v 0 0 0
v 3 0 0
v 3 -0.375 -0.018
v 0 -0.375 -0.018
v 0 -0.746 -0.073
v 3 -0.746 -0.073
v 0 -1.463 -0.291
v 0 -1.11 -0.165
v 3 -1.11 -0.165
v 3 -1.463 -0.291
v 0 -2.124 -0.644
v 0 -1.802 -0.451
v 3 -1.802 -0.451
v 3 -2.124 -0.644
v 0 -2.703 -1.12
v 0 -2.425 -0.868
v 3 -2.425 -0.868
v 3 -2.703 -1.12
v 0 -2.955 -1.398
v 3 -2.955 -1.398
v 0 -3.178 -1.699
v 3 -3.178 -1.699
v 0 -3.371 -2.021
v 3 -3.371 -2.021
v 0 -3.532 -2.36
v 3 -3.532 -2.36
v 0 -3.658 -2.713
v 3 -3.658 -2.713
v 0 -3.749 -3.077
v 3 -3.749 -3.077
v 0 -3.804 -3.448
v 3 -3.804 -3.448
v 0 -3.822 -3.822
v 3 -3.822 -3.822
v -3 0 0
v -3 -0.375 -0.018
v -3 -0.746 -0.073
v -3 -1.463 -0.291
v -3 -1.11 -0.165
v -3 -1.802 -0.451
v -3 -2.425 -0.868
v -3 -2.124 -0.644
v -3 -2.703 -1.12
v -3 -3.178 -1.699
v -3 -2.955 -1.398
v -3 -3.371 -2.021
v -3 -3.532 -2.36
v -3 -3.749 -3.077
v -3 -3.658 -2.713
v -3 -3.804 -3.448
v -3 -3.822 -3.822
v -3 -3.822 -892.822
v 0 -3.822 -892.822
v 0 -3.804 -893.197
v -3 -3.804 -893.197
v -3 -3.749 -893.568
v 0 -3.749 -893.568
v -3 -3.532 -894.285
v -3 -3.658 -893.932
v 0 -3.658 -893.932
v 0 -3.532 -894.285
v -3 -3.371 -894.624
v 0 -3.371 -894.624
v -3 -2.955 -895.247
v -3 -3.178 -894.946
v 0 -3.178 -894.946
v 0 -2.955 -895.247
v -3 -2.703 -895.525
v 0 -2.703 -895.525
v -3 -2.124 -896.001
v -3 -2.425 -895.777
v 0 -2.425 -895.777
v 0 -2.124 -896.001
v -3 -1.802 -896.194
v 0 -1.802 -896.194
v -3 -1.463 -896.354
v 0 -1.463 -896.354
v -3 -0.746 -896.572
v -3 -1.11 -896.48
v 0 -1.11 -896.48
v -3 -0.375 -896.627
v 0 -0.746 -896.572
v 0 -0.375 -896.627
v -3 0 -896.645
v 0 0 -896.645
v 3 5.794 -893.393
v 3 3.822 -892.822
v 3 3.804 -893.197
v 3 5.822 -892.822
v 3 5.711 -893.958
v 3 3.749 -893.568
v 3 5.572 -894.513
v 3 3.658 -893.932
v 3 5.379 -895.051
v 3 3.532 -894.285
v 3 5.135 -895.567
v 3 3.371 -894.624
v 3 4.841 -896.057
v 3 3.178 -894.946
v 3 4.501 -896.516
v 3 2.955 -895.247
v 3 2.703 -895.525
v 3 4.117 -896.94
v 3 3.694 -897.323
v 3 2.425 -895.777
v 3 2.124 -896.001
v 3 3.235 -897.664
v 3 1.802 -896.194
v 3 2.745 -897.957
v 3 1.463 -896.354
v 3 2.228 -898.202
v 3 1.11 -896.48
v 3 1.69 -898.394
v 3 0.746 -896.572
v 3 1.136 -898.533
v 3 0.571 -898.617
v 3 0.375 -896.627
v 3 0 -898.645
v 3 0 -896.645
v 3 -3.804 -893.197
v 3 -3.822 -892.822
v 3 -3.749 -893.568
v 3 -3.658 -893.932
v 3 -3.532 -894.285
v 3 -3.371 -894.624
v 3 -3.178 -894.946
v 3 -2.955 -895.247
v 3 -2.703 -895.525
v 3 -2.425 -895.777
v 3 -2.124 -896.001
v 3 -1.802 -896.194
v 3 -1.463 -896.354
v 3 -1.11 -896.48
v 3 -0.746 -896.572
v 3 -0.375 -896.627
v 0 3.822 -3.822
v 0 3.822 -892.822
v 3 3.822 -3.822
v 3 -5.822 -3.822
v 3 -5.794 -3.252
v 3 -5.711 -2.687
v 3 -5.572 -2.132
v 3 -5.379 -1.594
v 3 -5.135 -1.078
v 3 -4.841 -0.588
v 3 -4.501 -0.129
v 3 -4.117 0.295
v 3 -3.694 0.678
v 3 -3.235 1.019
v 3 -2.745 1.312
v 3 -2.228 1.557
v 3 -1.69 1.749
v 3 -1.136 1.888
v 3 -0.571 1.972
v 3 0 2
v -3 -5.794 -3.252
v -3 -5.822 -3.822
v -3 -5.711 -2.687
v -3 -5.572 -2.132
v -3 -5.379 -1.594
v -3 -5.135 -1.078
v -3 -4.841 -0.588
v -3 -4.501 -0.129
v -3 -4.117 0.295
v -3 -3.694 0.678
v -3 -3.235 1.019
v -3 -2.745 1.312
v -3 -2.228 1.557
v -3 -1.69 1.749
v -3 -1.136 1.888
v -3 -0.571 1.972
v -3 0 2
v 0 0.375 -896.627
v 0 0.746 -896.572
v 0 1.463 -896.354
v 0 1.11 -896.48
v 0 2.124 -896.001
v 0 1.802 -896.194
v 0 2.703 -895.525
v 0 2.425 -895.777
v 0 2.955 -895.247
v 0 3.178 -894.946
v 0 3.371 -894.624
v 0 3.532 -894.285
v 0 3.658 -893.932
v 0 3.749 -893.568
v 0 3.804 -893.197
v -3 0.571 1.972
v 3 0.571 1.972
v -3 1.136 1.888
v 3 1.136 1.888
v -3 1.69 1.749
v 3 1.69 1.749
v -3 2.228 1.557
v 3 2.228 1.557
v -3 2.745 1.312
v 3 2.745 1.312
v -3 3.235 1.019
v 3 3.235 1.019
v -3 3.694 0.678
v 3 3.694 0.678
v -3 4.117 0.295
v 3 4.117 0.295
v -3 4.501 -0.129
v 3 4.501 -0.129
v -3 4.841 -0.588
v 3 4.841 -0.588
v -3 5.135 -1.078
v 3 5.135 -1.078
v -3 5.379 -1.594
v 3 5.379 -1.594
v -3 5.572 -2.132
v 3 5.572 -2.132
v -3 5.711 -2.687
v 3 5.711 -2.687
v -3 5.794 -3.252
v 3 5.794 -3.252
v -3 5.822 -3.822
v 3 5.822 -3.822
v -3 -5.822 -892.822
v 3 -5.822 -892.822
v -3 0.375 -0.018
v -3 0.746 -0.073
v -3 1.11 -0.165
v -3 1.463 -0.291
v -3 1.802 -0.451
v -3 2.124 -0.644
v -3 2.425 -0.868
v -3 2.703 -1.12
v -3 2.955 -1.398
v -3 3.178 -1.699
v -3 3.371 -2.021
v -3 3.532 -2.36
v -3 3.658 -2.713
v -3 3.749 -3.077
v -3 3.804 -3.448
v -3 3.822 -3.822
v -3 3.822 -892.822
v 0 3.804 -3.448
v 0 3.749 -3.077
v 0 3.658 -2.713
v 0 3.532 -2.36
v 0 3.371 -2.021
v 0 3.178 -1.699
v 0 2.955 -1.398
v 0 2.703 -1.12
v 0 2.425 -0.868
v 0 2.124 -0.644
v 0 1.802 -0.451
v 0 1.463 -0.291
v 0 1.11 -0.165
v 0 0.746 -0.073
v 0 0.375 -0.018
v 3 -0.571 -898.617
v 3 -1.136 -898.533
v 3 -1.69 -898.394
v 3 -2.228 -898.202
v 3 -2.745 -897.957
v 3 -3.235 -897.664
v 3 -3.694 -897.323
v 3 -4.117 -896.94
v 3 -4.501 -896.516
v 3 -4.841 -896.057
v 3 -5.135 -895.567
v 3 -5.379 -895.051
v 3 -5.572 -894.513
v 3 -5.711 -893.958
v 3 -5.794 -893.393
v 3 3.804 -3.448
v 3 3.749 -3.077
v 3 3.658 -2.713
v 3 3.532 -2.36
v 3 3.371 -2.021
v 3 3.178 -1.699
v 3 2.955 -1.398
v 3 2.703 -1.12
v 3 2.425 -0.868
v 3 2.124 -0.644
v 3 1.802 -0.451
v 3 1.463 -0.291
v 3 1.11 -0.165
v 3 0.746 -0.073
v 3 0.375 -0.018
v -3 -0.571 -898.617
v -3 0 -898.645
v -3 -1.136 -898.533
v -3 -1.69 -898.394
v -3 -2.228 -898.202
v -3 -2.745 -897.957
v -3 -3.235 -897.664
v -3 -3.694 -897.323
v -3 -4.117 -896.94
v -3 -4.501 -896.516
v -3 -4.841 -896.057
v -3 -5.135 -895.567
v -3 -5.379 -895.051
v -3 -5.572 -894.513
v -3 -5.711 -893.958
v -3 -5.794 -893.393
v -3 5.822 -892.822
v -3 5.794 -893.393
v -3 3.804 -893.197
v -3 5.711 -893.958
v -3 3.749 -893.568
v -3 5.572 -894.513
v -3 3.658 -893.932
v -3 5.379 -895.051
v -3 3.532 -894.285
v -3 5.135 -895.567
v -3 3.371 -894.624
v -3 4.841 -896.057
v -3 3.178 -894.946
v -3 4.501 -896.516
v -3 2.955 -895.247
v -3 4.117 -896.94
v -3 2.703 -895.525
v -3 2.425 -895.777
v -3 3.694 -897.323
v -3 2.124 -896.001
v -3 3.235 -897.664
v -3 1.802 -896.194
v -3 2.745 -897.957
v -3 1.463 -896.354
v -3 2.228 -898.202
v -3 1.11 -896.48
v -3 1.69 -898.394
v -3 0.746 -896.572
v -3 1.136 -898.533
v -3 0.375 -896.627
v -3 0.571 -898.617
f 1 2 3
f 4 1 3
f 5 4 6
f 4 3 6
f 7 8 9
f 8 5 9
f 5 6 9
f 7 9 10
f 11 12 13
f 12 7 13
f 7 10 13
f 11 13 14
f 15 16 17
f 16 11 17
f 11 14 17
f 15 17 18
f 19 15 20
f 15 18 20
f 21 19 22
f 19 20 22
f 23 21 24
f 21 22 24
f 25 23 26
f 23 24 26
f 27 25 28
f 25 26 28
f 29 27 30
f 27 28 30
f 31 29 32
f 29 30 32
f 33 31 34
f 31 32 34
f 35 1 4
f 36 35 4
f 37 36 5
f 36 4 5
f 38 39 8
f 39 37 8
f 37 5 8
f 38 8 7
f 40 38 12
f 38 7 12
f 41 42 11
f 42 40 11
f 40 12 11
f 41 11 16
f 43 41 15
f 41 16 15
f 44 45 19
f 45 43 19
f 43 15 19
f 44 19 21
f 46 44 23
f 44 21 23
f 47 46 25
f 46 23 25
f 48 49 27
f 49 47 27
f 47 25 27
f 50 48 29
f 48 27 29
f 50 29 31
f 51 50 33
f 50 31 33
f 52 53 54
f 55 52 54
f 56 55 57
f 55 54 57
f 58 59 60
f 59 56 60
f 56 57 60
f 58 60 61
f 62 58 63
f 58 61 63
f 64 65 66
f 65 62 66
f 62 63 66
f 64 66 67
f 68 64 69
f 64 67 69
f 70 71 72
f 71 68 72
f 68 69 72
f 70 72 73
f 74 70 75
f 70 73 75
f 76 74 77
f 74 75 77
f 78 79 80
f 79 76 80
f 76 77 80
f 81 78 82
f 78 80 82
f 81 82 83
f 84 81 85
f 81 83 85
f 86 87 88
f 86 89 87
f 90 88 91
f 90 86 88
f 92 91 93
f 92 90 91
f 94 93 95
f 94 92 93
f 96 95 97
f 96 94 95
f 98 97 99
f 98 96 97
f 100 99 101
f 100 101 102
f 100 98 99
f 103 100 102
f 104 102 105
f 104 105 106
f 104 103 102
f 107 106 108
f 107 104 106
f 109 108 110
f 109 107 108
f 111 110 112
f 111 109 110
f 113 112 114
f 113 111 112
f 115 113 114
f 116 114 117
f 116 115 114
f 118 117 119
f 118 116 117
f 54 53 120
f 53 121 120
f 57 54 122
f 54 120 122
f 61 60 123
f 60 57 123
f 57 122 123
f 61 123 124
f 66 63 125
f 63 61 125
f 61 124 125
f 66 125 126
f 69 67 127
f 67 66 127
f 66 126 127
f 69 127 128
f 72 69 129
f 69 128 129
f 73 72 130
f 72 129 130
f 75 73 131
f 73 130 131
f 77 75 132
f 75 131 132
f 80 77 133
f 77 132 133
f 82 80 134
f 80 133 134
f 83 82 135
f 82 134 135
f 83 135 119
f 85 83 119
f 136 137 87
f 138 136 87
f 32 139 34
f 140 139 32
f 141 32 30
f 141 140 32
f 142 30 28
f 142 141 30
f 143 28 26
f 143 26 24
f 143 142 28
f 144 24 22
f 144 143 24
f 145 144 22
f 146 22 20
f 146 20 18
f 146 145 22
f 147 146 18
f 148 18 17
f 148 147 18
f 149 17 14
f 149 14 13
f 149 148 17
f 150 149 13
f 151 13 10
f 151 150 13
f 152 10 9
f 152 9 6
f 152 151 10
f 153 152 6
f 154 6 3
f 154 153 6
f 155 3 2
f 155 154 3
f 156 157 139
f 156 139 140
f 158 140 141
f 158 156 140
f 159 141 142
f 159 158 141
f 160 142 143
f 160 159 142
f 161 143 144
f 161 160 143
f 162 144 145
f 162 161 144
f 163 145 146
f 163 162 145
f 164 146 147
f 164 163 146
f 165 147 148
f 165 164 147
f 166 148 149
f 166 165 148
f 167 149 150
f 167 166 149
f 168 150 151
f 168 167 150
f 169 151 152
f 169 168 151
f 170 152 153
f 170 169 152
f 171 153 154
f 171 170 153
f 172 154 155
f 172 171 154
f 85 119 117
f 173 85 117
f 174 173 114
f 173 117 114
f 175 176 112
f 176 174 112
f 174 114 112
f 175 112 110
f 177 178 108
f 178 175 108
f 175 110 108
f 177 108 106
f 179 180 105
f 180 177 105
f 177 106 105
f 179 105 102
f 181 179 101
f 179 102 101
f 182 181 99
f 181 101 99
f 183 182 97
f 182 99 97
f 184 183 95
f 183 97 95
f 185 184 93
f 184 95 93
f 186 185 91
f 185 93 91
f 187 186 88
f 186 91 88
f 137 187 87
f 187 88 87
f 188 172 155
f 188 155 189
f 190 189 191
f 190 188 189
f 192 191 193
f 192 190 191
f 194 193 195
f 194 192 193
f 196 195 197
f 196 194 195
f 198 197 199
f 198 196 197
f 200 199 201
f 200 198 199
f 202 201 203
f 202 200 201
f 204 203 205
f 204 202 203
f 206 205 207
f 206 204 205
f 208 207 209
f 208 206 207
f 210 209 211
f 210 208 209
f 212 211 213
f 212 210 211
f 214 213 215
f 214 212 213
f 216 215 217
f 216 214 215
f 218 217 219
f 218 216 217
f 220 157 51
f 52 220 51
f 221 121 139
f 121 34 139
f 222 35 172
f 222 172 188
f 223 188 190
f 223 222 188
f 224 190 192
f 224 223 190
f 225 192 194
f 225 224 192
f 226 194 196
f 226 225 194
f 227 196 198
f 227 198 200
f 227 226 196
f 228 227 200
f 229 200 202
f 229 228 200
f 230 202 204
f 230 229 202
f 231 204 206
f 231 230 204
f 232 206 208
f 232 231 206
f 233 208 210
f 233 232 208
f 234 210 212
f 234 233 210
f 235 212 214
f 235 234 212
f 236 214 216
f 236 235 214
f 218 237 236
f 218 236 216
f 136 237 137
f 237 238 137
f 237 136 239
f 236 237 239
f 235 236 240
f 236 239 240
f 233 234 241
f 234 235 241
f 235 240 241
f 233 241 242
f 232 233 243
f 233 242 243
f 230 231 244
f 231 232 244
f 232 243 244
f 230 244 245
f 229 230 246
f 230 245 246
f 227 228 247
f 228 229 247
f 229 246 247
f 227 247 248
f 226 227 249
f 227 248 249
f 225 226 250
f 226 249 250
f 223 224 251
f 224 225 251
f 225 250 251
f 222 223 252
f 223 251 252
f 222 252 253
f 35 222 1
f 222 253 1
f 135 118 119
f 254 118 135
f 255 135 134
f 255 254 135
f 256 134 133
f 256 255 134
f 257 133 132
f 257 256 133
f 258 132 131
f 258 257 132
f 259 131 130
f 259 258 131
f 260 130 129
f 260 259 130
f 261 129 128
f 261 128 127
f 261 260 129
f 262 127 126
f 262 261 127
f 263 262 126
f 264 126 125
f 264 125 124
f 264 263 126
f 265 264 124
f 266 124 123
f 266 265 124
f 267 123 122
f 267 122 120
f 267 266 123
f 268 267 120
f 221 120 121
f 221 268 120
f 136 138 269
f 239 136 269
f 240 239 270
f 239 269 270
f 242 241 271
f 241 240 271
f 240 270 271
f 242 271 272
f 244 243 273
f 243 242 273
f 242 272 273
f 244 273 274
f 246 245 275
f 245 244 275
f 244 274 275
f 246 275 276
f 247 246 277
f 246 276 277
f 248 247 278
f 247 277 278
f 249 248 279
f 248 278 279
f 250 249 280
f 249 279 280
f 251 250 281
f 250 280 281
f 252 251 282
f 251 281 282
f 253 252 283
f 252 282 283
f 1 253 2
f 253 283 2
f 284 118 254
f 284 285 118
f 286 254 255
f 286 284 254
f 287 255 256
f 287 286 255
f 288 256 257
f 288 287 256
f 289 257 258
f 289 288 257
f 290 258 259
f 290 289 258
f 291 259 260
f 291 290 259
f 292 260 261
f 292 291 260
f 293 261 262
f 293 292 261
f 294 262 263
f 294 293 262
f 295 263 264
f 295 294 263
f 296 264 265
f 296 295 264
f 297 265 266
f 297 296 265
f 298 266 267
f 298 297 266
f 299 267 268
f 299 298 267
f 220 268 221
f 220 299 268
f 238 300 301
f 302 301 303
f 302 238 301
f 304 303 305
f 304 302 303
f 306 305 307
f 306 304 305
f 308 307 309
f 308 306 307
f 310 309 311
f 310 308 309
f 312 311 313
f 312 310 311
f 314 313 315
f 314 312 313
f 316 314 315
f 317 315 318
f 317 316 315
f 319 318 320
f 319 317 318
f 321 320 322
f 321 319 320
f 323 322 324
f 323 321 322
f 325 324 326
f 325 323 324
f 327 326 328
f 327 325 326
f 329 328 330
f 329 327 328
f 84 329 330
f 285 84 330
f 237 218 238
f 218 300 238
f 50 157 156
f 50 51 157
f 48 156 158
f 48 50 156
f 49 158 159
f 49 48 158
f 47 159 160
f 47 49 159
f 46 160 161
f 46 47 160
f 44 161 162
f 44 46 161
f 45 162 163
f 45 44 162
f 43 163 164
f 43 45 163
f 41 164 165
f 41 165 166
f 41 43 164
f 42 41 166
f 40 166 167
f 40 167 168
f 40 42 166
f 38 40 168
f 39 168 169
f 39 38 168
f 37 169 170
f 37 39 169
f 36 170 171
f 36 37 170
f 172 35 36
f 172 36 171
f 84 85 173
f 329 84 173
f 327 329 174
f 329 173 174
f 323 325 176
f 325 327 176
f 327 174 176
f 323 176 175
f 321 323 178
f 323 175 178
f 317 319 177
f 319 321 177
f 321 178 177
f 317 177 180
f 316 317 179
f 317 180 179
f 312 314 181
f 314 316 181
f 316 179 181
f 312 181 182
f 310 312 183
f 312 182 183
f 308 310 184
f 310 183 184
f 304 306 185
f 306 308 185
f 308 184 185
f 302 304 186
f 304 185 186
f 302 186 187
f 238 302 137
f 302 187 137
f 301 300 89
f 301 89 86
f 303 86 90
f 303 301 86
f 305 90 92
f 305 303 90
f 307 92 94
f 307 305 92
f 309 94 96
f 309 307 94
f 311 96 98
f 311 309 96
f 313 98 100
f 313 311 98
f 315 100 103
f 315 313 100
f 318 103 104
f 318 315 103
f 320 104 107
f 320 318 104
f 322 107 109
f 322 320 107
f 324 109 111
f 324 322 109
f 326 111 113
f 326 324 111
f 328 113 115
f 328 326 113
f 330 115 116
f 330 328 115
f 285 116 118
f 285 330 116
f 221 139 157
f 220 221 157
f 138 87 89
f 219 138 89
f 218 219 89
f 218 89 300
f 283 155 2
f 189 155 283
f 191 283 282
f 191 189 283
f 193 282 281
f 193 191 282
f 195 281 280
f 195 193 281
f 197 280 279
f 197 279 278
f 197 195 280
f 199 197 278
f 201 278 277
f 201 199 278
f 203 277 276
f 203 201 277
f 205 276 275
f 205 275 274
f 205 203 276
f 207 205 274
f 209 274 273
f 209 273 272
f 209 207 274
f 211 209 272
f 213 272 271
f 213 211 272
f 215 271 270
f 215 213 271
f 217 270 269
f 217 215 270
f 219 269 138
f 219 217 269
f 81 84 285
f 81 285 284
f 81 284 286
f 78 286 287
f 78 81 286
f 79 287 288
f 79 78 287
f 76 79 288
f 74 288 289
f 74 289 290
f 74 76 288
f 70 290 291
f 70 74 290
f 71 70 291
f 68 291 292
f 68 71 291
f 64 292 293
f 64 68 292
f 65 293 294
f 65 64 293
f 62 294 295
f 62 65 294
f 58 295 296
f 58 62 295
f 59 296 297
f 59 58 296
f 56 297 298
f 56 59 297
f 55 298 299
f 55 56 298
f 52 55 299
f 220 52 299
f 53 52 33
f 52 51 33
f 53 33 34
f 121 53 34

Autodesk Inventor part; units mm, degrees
ref_plane "YZ Plane" through (0, 0, 0) normal (1, 0, 0) x (0, 1, 0)
ref_plane "XZ Plane" through (0, 0, 0) normal (0, 1, 0) x (-1, 0, 0)
sketch "Sketch1" plane through (0, 0, 0) normal (1, 0, 0) x (0, 1, 0)
  line L0 (3.8225, -3.8225) -> (3.8225, -892.8225)
  arc A0 (3.8225, -3.8225) -> (0, 0) centre (0, -3.8225) ccw
  arc A1 (0, 0) -> (-3.8225, -3.8225) centre (0, -3.8225) ccw
  line L1 (-3.8225, -3.8225) -> (-3.8225, -892.8225)
  arc A2 (0, -896.645) -> (3.8225, -892.8225) centre (0, -892.8225) ccw
  arc A3 (-3.8225, -892.8225) -> (0, -896.645) centre (0, -892.8225) ccw
  line L2 (0, 0) -> (0, -7.645)
  line L3 (0, -889) -> (0, -896.645)
  dimension "d0" = 896.645
  dimension "d2" = 3.8225
  dimension "d3" = 3.8225
ref_plane "Work Plane1" through (0, 0, -3.8225) normal (0, 0, 1) x (1, 0, 0)
sketch "Sketch2" plane through (0, 0, -3.8225) normal (0, 0, 1) x (1, 0, 0)
  line L0 (-3, 5.8225) -> (3, 5.8225)
  line L1 (3, 5.8225) -> (3, 3.8225)
  line L2 (3, 3.8225) -> (-3, 3.8225)
  line L3 (-3, 3.8225) -> (-3, 5.8225)
  line L4 (0, 0) -> (0, 3.8225) projected
  point P0 (0, 0)
  point P1 (0, 5.8225)
  dimension "d5" = 2
  dimension "d6" = 0
  dimension "d7" = 6
sweep "Sweep1" add profiles "Sketch2" path "Sketch1" path curves L0 A2 A3 L1 A1 A0
properties part number "Carriage Belt"
